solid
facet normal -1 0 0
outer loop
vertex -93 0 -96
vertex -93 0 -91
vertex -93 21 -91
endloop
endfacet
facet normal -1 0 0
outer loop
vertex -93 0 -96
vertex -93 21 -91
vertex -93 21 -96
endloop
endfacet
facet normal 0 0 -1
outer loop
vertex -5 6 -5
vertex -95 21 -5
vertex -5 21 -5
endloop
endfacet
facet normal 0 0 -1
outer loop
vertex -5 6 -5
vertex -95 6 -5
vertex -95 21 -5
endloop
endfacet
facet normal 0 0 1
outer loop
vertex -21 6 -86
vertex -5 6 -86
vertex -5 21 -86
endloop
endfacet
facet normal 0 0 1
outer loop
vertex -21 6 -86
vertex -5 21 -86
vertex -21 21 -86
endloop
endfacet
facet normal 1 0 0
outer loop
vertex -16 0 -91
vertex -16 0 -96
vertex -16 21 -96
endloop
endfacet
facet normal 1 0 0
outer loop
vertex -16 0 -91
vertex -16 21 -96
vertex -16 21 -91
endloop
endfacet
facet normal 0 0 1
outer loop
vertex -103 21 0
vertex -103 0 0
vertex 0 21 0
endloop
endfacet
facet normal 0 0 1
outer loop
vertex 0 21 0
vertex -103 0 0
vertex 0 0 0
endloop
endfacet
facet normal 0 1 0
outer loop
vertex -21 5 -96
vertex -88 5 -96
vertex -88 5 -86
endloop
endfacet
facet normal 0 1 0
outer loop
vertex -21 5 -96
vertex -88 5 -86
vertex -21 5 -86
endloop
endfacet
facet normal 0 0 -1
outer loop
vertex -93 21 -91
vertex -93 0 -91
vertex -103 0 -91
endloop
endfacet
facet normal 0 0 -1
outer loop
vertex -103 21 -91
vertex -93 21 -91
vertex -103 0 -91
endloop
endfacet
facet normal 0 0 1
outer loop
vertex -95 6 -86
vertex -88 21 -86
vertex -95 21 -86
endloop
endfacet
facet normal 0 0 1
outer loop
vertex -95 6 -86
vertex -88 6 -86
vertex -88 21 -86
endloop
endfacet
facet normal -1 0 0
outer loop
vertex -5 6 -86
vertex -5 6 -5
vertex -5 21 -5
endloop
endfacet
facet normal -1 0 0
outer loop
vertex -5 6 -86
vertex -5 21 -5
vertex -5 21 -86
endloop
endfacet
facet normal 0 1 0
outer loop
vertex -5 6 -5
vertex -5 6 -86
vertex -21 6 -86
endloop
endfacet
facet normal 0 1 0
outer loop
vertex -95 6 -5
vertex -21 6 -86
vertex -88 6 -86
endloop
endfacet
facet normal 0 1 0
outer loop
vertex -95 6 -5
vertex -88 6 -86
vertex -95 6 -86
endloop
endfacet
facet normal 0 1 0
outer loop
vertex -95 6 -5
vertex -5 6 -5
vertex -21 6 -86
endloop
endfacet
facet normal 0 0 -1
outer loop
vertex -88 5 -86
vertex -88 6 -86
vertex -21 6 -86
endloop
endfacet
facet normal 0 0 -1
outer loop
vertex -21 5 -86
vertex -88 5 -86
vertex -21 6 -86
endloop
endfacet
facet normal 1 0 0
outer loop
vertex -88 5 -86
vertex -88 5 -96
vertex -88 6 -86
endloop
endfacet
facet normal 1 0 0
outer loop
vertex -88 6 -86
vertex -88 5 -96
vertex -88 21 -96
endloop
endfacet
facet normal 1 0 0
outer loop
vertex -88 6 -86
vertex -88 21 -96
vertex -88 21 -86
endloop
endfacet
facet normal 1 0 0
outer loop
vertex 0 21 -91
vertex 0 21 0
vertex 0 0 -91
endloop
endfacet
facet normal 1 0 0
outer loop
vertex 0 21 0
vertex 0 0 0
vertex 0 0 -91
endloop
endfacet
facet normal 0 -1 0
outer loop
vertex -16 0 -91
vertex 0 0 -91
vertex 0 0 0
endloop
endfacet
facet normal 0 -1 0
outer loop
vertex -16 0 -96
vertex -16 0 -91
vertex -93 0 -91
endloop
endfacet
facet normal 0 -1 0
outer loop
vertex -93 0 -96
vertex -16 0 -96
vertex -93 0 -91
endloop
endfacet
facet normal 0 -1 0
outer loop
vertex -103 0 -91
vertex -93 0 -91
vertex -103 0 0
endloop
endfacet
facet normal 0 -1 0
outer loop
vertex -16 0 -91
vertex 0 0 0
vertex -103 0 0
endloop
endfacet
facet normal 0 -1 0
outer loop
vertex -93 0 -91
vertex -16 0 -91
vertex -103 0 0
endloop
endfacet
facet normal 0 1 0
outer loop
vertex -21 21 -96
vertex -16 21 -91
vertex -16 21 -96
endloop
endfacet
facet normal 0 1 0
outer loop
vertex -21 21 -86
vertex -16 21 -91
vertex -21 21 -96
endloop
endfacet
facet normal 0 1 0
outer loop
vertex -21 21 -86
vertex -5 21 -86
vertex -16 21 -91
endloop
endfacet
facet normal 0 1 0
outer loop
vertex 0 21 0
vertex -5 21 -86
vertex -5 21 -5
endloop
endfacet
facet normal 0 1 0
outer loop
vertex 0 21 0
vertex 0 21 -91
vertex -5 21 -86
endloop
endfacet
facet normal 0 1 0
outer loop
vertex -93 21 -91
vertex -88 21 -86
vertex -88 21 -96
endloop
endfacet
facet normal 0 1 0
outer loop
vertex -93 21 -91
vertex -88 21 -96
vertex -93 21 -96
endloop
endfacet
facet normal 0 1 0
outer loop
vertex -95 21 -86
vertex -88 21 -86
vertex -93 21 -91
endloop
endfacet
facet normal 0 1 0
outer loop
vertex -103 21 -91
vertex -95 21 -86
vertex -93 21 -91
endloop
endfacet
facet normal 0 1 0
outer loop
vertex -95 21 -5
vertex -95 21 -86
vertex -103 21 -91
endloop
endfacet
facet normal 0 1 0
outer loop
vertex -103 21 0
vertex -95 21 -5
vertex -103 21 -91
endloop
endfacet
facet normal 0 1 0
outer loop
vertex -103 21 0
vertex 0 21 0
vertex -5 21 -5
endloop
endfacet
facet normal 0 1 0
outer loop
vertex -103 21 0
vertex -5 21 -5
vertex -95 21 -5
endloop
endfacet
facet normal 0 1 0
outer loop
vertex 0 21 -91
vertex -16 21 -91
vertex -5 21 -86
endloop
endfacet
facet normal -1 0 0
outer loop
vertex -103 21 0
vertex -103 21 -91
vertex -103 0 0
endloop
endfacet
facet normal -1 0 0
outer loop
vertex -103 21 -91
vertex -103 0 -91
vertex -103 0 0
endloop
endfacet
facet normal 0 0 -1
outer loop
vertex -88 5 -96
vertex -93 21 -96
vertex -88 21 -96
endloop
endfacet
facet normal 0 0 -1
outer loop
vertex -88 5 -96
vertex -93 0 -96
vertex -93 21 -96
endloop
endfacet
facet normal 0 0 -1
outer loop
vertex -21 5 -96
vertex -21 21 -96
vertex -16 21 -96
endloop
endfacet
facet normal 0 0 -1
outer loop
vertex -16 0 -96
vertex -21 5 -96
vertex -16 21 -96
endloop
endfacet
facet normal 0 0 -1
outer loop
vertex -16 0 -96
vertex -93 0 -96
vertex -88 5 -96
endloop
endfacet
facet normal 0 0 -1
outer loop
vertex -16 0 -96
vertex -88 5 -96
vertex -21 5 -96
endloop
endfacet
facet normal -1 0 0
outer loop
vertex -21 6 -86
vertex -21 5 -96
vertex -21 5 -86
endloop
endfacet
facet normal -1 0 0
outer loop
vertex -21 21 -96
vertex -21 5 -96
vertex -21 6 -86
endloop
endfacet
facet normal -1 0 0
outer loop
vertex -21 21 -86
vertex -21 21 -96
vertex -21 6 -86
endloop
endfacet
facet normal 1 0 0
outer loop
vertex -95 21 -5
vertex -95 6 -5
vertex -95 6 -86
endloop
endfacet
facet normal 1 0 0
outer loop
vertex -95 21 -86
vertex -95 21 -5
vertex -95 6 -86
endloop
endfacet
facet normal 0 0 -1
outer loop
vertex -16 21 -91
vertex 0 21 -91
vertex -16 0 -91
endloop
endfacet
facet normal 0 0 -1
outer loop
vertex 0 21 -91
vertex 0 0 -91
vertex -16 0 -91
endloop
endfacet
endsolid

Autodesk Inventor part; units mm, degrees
ref_plane "YZ Plane" through (0, 0, 0) normal (1, 0, 0) x (0, 1, 0)
ref_plane "XZ Plane" through (0, 0, 0) normal (0, 1, 0) x (-1, 0, 0)
ref_plane "XY Plane" through (0, 0, 0) normal (0, 0, 1) x (1, 0, 0)
sketch "스케치1" plane through (0, 0, 0) normal (0, 1, 0) x (-1, 0, 0)
  line L0 (103, 0) -> (93, 0)
  line L1 (0, 0) -> (0, -91)
  line L2 (0, -91) -> (103, -91)
  line L3 (103, -91) -> (103, 0)
  line L4 (93, -91) -> (93, -96)
  line L5 (93, -96) -> (16, -96)
  line L6 (16, -96) -> (16, -91)
  line L7 (93, 0) -> (0, 0)
  line L8 (103, -5) -> (0, -5)
  line L9 (5, 0) -> (5, -91)
  line L10 (0, -86) -> (103, -86)
  line L11 (95, 0) -> (95, -91)
  point P0 (93, -93.5)
  point P1 (16, -93.5)
  point P2 (51.5, -86)
  point P3 (95, -5)
  point P4 (95, -86)
  point P5 (5, -86)
  point P6 (5, -5)
  dimension "d0" = 103
  dimension "d1" = 91
  dimension "d2" = 5
  dimension "d3" = 10
  dimension "d4" = 16
  dimension "d5" = 8
  dimension "d6" = 5
  dimension "d7" = 5
  dimension "d8" = 5
extrude "돌출1" add sketch "스케치1" along normal blind 21 contours L3 L8 L11 L0 | L11 L8 L9 L7 L0 | L3 L10 L11 L8 | L3 L2 L11 L10 | L9 L8 L1 L7 | L9 L10 L1 L8 | L11 L2 L9 L10 | L9 L2 L1 L10 | L4 L5 L6 L2
extrude "돌출2" add sketch "스케치1" along normal blind 6 contours L11 L10 L9 L8
sketch "스케치2" plane through (0, 21, 0) normal (0, 1, 0) x (1, 0, 0)
  line L0 (-16, 96) -> (-93, 96) projected
  line L1 (-21, 96) -> (-21, 86)
  line L2 (-95, 86) -> (-5, 86) projected
  line L3 (-88, 96) -> (-88, 76.7304)
  line L4 (-93, 96) -> (-93, 91) projected
  line L5 (-16, 91) -> (-16, 96) projected
  point P0 (0, 0)
  point P1 (-93, 93.5)
  point P2 (-88, 86)
  dimension "d13" = 5
  dimension "d14" = 5
extrude "돌출3" cut sketch "스케치2" against normal blind 16
properties part number "imu"
